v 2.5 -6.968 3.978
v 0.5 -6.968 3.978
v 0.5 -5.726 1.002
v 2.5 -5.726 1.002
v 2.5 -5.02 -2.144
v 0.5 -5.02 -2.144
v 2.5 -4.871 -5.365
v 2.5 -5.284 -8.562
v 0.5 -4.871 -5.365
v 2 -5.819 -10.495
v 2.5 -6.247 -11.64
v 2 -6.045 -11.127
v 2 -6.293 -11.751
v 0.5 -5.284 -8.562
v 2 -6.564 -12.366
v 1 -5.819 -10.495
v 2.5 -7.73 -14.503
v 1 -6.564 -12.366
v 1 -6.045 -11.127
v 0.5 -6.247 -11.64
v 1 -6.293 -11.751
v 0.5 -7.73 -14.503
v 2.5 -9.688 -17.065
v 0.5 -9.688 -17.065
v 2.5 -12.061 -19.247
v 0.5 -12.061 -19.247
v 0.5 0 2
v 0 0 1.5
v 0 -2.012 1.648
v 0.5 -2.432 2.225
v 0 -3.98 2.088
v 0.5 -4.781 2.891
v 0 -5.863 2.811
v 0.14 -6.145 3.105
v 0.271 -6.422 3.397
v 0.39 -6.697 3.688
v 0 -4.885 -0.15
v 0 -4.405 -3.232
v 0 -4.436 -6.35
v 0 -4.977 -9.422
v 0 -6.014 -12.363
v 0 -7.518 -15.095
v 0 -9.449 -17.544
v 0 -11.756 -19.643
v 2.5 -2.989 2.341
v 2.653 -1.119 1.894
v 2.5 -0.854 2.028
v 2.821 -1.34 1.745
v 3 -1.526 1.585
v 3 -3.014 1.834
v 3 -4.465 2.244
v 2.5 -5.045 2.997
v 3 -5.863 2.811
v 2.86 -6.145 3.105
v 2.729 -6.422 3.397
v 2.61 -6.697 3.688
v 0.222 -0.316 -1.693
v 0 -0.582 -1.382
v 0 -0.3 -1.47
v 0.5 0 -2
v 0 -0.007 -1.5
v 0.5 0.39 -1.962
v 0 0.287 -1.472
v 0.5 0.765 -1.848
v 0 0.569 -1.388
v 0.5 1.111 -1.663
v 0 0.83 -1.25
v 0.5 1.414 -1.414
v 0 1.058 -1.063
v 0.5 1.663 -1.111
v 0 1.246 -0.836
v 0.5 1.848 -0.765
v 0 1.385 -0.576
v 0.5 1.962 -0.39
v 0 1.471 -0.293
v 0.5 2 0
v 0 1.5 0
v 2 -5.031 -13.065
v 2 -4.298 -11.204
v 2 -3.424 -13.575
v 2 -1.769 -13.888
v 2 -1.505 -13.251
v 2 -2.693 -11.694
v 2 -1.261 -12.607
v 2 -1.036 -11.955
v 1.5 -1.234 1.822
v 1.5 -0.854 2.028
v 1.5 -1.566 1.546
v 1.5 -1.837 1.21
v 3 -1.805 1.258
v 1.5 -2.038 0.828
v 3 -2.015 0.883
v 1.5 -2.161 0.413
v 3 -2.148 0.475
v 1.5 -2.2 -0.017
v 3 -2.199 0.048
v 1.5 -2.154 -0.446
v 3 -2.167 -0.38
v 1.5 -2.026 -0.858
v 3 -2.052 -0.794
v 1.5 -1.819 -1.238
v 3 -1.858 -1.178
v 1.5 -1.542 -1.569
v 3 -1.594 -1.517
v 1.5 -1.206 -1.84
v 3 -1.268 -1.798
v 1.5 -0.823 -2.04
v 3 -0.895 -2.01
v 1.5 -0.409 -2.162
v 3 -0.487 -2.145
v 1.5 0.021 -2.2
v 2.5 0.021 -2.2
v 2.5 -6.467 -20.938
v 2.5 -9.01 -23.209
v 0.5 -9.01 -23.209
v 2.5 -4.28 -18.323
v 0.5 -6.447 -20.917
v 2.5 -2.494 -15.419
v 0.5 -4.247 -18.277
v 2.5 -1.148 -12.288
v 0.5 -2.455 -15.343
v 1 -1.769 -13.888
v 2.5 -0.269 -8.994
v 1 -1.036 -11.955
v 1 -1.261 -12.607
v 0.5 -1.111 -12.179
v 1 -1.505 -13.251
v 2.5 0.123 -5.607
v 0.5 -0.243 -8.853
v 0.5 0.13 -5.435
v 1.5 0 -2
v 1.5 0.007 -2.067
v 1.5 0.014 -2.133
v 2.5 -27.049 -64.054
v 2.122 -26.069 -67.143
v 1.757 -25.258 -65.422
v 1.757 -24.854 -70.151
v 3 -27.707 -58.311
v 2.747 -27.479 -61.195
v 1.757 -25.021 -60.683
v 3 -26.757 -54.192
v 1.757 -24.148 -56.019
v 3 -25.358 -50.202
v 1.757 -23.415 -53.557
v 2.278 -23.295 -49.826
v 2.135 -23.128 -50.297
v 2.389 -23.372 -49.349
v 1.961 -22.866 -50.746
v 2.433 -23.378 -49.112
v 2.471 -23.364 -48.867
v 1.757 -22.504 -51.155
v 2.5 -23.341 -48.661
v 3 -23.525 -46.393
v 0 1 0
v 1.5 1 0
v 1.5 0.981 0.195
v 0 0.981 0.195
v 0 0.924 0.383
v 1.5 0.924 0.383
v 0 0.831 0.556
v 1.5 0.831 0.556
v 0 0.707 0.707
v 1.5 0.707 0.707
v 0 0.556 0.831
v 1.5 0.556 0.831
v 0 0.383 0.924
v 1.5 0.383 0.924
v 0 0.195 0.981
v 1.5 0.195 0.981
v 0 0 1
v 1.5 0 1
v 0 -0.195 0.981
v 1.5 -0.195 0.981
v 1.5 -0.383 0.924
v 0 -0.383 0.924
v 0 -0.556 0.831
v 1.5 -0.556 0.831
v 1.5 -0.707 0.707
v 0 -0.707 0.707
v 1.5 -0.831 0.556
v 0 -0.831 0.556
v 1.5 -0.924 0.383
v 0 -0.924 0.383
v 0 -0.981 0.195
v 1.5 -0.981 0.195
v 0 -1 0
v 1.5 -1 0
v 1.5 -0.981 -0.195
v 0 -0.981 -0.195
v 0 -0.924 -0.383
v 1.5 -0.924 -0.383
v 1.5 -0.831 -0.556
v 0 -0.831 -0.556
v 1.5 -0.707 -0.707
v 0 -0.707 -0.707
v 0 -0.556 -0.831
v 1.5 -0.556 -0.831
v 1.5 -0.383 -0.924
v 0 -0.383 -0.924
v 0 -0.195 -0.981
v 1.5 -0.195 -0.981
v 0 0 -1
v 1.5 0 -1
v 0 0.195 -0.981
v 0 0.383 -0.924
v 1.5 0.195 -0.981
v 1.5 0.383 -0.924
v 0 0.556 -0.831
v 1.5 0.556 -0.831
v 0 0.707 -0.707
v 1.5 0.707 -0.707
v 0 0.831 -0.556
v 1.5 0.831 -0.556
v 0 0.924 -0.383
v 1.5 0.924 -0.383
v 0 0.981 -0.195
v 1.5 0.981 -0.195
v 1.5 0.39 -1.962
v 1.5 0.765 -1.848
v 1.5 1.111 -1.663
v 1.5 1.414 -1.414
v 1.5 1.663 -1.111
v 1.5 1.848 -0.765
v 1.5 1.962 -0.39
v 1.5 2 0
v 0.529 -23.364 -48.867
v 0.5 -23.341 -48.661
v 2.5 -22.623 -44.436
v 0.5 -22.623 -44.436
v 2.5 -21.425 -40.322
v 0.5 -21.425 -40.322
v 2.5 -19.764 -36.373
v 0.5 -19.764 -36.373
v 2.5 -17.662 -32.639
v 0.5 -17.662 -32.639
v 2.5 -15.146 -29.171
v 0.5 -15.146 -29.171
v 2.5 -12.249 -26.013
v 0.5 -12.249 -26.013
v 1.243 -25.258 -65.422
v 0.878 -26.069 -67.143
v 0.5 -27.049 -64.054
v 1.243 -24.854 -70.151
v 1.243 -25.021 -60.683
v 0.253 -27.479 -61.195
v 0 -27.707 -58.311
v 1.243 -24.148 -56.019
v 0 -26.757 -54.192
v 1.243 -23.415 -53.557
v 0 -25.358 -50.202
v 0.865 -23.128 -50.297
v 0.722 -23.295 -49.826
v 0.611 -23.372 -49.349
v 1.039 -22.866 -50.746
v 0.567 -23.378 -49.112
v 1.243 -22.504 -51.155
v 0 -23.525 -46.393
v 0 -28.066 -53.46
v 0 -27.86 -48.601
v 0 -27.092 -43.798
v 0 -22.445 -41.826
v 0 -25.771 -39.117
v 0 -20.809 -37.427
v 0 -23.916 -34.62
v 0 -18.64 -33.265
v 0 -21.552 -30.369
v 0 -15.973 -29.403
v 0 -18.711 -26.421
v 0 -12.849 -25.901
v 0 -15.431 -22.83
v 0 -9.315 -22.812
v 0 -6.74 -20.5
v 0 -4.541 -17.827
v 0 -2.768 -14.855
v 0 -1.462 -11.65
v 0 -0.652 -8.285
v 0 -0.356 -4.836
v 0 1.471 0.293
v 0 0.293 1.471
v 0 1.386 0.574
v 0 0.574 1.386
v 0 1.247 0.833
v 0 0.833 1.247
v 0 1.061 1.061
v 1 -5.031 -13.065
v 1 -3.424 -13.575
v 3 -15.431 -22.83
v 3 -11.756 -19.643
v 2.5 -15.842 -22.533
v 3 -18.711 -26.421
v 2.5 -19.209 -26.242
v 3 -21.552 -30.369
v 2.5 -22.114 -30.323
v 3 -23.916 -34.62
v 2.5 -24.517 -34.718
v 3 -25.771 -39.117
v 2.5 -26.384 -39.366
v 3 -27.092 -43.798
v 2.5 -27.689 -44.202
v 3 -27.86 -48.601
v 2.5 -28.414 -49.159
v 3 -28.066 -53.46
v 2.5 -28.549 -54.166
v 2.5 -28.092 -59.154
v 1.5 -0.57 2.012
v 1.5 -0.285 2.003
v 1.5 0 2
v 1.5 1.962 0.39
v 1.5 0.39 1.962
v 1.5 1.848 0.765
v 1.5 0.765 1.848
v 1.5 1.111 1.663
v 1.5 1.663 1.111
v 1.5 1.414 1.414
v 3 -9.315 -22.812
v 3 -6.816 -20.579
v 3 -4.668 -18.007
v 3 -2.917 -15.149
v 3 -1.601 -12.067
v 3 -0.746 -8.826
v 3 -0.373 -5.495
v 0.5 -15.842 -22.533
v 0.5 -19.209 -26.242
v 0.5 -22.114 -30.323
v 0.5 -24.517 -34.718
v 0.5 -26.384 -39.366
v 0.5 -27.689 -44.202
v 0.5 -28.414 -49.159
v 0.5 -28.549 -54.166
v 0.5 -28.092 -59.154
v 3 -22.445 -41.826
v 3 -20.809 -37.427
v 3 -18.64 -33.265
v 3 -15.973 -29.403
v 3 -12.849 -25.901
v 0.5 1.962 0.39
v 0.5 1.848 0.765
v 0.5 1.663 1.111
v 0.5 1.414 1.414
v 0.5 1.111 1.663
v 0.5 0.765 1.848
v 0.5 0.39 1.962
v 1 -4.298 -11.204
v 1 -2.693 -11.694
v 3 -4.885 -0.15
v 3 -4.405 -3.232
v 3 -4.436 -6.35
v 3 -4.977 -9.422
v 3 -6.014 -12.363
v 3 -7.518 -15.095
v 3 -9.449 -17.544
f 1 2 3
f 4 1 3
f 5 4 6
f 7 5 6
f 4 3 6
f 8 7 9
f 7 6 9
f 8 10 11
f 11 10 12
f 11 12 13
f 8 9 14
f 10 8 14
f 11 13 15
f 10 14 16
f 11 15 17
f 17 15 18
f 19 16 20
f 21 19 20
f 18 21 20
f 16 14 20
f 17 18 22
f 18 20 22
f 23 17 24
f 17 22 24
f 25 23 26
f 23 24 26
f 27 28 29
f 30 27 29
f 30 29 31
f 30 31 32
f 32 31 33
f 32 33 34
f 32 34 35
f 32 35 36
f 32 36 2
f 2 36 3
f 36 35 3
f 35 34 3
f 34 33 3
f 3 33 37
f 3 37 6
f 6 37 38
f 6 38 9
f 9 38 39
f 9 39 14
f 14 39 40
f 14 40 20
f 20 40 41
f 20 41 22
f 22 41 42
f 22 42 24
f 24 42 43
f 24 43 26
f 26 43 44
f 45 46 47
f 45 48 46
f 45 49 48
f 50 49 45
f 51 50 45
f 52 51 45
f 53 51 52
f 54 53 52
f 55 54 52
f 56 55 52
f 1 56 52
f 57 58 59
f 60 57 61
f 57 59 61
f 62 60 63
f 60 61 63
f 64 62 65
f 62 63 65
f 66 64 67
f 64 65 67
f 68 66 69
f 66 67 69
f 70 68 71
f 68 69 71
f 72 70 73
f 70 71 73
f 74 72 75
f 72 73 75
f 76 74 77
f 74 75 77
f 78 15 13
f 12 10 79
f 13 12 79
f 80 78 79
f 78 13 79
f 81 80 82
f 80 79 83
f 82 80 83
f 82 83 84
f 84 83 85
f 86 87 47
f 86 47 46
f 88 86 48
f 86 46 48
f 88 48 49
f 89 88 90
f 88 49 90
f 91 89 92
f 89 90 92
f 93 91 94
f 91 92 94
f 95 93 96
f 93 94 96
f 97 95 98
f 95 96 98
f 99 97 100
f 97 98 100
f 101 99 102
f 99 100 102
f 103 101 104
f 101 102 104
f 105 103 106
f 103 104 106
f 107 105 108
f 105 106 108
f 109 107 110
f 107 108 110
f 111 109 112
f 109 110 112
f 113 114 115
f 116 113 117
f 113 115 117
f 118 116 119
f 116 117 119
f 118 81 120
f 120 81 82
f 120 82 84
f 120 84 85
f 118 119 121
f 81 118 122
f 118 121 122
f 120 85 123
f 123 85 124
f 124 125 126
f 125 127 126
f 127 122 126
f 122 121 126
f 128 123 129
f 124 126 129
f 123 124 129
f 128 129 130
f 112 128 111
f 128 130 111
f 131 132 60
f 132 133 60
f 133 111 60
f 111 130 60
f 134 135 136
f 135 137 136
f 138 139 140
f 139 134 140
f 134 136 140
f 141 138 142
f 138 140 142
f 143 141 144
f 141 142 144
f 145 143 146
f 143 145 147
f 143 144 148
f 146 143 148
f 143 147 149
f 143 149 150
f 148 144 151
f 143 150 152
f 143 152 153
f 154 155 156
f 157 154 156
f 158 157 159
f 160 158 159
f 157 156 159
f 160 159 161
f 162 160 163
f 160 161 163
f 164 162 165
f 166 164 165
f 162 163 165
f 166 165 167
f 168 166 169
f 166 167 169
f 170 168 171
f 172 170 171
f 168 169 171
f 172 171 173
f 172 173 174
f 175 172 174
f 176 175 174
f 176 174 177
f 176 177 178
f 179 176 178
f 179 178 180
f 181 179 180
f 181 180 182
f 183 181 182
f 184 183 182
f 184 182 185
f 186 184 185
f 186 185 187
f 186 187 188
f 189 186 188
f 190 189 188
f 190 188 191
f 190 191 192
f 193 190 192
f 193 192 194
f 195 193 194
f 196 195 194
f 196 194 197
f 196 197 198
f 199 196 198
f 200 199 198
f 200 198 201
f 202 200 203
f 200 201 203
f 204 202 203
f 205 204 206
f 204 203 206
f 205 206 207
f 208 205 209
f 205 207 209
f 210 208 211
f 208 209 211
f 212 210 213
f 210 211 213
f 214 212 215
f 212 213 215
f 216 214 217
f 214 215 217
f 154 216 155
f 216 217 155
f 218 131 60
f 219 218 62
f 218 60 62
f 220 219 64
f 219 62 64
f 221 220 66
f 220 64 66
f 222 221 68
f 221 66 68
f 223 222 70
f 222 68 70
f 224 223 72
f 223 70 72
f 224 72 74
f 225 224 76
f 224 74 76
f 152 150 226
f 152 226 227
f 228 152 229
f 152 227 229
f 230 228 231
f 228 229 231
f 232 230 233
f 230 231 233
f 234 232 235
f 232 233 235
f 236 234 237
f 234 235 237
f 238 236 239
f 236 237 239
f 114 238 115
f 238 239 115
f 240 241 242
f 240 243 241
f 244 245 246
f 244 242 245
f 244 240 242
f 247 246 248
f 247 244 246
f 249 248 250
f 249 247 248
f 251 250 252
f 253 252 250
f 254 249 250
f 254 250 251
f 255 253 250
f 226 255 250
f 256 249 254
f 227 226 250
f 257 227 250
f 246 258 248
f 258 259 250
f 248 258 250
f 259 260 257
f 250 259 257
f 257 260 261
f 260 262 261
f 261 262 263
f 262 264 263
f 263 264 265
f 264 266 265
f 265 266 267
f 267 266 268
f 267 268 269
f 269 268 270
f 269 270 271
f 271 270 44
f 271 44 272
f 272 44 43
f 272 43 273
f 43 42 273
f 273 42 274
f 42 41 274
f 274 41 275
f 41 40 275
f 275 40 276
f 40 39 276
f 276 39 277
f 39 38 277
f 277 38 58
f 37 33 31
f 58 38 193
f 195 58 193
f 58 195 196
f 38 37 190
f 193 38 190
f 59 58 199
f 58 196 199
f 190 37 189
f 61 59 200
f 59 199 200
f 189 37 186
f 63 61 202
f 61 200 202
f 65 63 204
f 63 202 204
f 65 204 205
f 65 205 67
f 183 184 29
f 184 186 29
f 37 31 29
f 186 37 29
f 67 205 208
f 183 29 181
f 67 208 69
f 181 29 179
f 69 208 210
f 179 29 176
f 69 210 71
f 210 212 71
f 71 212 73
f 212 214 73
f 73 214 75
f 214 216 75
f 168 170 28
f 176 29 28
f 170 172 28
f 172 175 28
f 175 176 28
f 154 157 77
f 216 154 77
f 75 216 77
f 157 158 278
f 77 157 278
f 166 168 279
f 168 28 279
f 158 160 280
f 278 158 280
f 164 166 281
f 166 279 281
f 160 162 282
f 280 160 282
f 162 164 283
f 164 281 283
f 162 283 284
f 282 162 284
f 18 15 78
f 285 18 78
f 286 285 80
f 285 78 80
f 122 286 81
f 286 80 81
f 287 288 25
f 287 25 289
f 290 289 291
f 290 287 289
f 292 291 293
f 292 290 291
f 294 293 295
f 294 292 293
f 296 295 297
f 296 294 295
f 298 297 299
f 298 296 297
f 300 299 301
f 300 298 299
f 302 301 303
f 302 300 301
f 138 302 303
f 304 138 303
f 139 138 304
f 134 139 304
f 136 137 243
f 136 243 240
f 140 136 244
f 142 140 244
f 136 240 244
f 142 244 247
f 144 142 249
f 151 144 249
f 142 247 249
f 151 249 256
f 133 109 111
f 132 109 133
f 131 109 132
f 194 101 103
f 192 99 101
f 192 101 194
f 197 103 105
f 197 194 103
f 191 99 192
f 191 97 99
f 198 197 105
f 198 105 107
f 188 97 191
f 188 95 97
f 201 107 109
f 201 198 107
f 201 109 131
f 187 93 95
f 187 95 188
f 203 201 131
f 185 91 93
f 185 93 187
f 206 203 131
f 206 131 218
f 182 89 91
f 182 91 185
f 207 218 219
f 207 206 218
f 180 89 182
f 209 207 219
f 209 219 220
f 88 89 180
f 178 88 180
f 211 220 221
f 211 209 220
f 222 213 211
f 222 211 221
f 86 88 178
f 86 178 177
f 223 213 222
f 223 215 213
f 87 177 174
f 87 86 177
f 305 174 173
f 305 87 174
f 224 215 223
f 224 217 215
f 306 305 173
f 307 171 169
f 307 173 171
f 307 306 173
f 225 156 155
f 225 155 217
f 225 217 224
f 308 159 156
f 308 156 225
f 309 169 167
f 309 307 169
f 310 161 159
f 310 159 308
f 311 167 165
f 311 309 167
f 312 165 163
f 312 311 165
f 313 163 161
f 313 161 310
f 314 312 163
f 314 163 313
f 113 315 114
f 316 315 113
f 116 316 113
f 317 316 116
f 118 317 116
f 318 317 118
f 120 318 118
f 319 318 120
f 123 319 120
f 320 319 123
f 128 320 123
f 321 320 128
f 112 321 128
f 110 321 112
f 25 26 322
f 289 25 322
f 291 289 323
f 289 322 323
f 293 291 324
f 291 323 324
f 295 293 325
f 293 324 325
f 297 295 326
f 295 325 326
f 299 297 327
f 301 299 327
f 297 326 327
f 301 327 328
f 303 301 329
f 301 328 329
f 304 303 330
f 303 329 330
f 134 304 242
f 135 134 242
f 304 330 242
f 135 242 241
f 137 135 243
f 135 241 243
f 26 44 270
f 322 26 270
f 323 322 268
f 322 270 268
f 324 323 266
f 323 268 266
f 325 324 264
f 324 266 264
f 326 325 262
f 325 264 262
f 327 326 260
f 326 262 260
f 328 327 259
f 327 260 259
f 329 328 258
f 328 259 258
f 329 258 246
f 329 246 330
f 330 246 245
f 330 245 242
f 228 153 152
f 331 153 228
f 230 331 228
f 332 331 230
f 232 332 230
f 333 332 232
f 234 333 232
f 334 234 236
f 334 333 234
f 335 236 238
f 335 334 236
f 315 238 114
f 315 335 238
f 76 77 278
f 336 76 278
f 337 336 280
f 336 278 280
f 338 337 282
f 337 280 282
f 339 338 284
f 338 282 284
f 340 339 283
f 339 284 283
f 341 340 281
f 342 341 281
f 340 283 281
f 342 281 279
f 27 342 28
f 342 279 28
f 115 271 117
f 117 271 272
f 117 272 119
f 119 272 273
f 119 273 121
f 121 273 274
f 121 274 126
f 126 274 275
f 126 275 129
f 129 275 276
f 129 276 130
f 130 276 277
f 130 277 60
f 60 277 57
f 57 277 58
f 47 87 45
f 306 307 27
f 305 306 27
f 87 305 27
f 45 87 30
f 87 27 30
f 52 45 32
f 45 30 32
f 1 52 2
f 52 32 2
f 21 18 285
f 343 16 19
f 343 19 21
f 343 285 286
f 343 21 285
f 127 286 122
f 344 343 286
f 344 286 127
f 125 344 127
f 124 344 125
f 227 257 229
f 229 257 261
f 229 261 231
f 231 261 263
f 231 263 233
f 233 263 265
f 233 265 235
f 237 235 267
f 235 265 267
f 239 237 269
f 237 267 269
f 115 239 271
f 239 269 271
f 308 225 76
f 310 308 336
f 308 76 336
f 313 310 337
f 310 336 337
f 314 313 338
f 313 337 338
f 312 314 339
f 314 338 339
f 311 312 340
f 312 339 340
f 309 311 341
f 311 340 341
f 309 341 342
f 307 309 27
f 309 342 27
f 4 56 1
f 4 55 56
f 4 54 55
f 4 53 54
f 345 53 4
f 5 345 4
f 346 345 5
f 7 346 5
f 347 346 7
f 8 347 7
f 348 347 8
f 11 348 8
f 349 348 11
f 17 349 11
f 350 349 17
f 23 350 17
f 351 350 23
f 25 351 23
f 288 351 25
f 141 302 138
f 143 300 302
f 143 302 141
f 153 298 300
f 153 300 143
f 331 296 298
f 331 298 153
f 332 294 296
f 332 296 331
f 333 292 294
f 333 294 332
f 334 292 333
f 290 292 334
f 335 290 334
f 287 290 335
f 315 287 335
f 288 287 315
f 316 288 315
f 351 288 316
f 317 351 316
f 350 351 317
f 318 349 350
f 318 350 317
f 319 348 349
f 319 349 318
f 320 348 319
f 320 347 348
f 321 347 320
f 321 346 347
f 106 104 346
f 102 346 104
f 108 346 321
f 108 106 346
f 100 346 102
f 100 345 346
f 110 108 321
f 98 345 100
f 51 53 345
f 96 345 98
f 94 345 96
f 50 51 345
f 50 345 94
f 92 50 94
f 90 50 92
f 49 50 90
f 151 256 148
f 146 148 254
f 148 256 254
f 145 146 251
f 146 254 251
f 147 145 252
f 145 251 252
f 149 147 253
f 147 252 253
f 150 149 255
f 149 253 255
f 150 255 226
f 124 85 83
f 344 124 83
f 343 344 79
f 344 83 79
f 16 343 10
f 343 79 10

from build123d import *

# Parameters (mm, degrees)
F1_DEPTH    = 3
F2_SIZE     = 0.5
F3_R        = 2.2
F4_DEPTH    = 1.5
F5_R        = 1
F6_DEPTH    = 25
F7_T2_ANGLE = 66.979105944
F7_T4_ANGLE = 66.979105944
F9_START    = -1
F9_DEPTH    = 1


# Not quite as in the source:
# - a fillet or chamfer that OpenCascade refuses, or shapes differently, is made with other operations: its cross-section is extruded or revolved along the edge and cut away or added


with BuildPart() as f1:
    # F0 (on Right) → F1 (new body)
    with BuildSketch(Plane.YZ):
        with BuildLine():
            ThreePointArc((0, -2), (1.4142135624, -1.4142135624), (2, 0))
            ThreePointArc((2, 0), (1.4142135624, 1.4142135624), (0, 2))
            ThreePointArc((0, 2), (-2, 0), (0, -2))
        make_face()
        with BuildLine():
            ThreePointArc((0, -2), (-2, 0), (0, 2))
            ThreePointArc((0, 2), (-3.6215795528, 2.5039519212), (-6.9679827429, 3.9775162004))
            ThreePointArc((-6.9679827429, 3.9775162004), (-5.2841991645, -8.562454479), (-12.0608618515, -19.247155439))
            ThreePointArc((-12.0608618515, -19.247155439), (-27.2940486142, -42.4780574149), (-24.8540620048, -70.1506295922))
            ThreePointArc((-24.8540620048, -70.1506295922), (-24.9977932498, -60.4898051339), (-22.5043967366, -51.1551834643))
            ThreePointArc((-22.5043967366, -51.1551834643), (-23.2047477115, -50.1129852075), (-23.3636565752, -48.8674264303))
            ThreePointArc((-23.3636565752, -48.8674264303), (-18.817838904, -34.5662944148), (-9.0101721364, -23.2086314596))
            ThreePointArc((-9.0101721364, -23.2086314596), (-1.7247742588, -13.7854899156), (0, -2))
        make_face()
    extrude(amount=F1_DEPTH)

    # F2
    f2_edges = [f1.edges().sort_by_distance(p)[0] for p in [
        (3, 2, 0),
        (3, -3.62158, 2.503952),
        (3, -5.284199, -8.562454),
        (3, -27.294049, -42.478057),
        (3, -24.997793, -60.489805),
        (3, -23.204748, -50.112985),
        (3, -18.817839, -34.566294),
        (3, -1.724774, -13.78549),
        (0, 2, 0),
        (0, -3.62158, 2.503952),
        (0, -5.284199, -8.562454),
        (0, -27.294049, -42.478057),
        (0, -24.997793, -60.489805),
        (0, -23.204748, -50.112985),
        (0, -18.817839, -34.566294),
        (0, -1.724774, -13.78549),
    ]]
    chamfer(f2_edges, length=F2_SIZE)

    # F3 (on face) → F4 (cut)
    with BuildSketch(Plane.YZ.offset(3)):
        Circle(F3_R)
    extrude(amount=-F4_DEPTH, mode=Mode.SUBTRACT)

    # F5 (on face) → F6 (cut)
    with BuildSketch(Plane.YZ.offset(1.5)):
        Circle(F5_R)
    extrude(amount=-F6_DEPTH, mode=Mode.SUBTRACT)

    # F7: chamfer of 2.5 on 2 edges, made by hand

    # F7_s1 → F7_t2 (revolve, cut)
    with BuildSketch(Plane(origin=(0, 33.2597277938, -48.8887943232), x_dir=(1, 0, 0), z_dir=(0, 0.5624874969, -0.8268057909))):
        Polygon((0, 66.4232158642), (1.767766953, 62.1554489112), (0, 63.9232158642), align=None)
    revolve(axis=Axis((0, 9.8679252657, -64.8025634284), (-1, 0, 0)), revolution_arc=F7_T2_ANGLE, mode=Mode.SUBTRACT)

    # F7_s3 → F7_t4 (revolve, cut)
    with BuildSketch(Plane(origin=(0, 33.2597277938, -48.8887943232), x_dir=(1, 0, 0), z_dir=(0, 0.5624874969, -0.8268057909))):
        Polygon((3, 66.4232158642), (1.232233047, 62.1554489112), (3, 63.9232158642), align=None)
    revolve(axis=Axis((3, 9.8679252657, -64.8025634284), (-1, 0, 0)), revolution_arc=F7_T4_ANGLE, mode=Mode.SUBTRACT)

    # F8 (on face) → F9 (cut)
    with BuildSketch(Plane.YZ.offset(3).offset(F9_START)):
        with BuildLine():
            ThreePointArc((14, 0), (0, 14), (-14, 0))
            ThreePointArc((-14, 0), (0, -14), (14, 0))
        make_face()
        with BuildLine():
            ThreePointArc((-12, 0), (0, 12), (12, 0))
            ThreePointArc((12, 0), (0, -12), (-12, 0))
        make_face(mode=Mode.SUBTRACT)
    extrude(amount=-F9_DEPTH, mode=Mode.SUBTRACT)


solid = f1.part
